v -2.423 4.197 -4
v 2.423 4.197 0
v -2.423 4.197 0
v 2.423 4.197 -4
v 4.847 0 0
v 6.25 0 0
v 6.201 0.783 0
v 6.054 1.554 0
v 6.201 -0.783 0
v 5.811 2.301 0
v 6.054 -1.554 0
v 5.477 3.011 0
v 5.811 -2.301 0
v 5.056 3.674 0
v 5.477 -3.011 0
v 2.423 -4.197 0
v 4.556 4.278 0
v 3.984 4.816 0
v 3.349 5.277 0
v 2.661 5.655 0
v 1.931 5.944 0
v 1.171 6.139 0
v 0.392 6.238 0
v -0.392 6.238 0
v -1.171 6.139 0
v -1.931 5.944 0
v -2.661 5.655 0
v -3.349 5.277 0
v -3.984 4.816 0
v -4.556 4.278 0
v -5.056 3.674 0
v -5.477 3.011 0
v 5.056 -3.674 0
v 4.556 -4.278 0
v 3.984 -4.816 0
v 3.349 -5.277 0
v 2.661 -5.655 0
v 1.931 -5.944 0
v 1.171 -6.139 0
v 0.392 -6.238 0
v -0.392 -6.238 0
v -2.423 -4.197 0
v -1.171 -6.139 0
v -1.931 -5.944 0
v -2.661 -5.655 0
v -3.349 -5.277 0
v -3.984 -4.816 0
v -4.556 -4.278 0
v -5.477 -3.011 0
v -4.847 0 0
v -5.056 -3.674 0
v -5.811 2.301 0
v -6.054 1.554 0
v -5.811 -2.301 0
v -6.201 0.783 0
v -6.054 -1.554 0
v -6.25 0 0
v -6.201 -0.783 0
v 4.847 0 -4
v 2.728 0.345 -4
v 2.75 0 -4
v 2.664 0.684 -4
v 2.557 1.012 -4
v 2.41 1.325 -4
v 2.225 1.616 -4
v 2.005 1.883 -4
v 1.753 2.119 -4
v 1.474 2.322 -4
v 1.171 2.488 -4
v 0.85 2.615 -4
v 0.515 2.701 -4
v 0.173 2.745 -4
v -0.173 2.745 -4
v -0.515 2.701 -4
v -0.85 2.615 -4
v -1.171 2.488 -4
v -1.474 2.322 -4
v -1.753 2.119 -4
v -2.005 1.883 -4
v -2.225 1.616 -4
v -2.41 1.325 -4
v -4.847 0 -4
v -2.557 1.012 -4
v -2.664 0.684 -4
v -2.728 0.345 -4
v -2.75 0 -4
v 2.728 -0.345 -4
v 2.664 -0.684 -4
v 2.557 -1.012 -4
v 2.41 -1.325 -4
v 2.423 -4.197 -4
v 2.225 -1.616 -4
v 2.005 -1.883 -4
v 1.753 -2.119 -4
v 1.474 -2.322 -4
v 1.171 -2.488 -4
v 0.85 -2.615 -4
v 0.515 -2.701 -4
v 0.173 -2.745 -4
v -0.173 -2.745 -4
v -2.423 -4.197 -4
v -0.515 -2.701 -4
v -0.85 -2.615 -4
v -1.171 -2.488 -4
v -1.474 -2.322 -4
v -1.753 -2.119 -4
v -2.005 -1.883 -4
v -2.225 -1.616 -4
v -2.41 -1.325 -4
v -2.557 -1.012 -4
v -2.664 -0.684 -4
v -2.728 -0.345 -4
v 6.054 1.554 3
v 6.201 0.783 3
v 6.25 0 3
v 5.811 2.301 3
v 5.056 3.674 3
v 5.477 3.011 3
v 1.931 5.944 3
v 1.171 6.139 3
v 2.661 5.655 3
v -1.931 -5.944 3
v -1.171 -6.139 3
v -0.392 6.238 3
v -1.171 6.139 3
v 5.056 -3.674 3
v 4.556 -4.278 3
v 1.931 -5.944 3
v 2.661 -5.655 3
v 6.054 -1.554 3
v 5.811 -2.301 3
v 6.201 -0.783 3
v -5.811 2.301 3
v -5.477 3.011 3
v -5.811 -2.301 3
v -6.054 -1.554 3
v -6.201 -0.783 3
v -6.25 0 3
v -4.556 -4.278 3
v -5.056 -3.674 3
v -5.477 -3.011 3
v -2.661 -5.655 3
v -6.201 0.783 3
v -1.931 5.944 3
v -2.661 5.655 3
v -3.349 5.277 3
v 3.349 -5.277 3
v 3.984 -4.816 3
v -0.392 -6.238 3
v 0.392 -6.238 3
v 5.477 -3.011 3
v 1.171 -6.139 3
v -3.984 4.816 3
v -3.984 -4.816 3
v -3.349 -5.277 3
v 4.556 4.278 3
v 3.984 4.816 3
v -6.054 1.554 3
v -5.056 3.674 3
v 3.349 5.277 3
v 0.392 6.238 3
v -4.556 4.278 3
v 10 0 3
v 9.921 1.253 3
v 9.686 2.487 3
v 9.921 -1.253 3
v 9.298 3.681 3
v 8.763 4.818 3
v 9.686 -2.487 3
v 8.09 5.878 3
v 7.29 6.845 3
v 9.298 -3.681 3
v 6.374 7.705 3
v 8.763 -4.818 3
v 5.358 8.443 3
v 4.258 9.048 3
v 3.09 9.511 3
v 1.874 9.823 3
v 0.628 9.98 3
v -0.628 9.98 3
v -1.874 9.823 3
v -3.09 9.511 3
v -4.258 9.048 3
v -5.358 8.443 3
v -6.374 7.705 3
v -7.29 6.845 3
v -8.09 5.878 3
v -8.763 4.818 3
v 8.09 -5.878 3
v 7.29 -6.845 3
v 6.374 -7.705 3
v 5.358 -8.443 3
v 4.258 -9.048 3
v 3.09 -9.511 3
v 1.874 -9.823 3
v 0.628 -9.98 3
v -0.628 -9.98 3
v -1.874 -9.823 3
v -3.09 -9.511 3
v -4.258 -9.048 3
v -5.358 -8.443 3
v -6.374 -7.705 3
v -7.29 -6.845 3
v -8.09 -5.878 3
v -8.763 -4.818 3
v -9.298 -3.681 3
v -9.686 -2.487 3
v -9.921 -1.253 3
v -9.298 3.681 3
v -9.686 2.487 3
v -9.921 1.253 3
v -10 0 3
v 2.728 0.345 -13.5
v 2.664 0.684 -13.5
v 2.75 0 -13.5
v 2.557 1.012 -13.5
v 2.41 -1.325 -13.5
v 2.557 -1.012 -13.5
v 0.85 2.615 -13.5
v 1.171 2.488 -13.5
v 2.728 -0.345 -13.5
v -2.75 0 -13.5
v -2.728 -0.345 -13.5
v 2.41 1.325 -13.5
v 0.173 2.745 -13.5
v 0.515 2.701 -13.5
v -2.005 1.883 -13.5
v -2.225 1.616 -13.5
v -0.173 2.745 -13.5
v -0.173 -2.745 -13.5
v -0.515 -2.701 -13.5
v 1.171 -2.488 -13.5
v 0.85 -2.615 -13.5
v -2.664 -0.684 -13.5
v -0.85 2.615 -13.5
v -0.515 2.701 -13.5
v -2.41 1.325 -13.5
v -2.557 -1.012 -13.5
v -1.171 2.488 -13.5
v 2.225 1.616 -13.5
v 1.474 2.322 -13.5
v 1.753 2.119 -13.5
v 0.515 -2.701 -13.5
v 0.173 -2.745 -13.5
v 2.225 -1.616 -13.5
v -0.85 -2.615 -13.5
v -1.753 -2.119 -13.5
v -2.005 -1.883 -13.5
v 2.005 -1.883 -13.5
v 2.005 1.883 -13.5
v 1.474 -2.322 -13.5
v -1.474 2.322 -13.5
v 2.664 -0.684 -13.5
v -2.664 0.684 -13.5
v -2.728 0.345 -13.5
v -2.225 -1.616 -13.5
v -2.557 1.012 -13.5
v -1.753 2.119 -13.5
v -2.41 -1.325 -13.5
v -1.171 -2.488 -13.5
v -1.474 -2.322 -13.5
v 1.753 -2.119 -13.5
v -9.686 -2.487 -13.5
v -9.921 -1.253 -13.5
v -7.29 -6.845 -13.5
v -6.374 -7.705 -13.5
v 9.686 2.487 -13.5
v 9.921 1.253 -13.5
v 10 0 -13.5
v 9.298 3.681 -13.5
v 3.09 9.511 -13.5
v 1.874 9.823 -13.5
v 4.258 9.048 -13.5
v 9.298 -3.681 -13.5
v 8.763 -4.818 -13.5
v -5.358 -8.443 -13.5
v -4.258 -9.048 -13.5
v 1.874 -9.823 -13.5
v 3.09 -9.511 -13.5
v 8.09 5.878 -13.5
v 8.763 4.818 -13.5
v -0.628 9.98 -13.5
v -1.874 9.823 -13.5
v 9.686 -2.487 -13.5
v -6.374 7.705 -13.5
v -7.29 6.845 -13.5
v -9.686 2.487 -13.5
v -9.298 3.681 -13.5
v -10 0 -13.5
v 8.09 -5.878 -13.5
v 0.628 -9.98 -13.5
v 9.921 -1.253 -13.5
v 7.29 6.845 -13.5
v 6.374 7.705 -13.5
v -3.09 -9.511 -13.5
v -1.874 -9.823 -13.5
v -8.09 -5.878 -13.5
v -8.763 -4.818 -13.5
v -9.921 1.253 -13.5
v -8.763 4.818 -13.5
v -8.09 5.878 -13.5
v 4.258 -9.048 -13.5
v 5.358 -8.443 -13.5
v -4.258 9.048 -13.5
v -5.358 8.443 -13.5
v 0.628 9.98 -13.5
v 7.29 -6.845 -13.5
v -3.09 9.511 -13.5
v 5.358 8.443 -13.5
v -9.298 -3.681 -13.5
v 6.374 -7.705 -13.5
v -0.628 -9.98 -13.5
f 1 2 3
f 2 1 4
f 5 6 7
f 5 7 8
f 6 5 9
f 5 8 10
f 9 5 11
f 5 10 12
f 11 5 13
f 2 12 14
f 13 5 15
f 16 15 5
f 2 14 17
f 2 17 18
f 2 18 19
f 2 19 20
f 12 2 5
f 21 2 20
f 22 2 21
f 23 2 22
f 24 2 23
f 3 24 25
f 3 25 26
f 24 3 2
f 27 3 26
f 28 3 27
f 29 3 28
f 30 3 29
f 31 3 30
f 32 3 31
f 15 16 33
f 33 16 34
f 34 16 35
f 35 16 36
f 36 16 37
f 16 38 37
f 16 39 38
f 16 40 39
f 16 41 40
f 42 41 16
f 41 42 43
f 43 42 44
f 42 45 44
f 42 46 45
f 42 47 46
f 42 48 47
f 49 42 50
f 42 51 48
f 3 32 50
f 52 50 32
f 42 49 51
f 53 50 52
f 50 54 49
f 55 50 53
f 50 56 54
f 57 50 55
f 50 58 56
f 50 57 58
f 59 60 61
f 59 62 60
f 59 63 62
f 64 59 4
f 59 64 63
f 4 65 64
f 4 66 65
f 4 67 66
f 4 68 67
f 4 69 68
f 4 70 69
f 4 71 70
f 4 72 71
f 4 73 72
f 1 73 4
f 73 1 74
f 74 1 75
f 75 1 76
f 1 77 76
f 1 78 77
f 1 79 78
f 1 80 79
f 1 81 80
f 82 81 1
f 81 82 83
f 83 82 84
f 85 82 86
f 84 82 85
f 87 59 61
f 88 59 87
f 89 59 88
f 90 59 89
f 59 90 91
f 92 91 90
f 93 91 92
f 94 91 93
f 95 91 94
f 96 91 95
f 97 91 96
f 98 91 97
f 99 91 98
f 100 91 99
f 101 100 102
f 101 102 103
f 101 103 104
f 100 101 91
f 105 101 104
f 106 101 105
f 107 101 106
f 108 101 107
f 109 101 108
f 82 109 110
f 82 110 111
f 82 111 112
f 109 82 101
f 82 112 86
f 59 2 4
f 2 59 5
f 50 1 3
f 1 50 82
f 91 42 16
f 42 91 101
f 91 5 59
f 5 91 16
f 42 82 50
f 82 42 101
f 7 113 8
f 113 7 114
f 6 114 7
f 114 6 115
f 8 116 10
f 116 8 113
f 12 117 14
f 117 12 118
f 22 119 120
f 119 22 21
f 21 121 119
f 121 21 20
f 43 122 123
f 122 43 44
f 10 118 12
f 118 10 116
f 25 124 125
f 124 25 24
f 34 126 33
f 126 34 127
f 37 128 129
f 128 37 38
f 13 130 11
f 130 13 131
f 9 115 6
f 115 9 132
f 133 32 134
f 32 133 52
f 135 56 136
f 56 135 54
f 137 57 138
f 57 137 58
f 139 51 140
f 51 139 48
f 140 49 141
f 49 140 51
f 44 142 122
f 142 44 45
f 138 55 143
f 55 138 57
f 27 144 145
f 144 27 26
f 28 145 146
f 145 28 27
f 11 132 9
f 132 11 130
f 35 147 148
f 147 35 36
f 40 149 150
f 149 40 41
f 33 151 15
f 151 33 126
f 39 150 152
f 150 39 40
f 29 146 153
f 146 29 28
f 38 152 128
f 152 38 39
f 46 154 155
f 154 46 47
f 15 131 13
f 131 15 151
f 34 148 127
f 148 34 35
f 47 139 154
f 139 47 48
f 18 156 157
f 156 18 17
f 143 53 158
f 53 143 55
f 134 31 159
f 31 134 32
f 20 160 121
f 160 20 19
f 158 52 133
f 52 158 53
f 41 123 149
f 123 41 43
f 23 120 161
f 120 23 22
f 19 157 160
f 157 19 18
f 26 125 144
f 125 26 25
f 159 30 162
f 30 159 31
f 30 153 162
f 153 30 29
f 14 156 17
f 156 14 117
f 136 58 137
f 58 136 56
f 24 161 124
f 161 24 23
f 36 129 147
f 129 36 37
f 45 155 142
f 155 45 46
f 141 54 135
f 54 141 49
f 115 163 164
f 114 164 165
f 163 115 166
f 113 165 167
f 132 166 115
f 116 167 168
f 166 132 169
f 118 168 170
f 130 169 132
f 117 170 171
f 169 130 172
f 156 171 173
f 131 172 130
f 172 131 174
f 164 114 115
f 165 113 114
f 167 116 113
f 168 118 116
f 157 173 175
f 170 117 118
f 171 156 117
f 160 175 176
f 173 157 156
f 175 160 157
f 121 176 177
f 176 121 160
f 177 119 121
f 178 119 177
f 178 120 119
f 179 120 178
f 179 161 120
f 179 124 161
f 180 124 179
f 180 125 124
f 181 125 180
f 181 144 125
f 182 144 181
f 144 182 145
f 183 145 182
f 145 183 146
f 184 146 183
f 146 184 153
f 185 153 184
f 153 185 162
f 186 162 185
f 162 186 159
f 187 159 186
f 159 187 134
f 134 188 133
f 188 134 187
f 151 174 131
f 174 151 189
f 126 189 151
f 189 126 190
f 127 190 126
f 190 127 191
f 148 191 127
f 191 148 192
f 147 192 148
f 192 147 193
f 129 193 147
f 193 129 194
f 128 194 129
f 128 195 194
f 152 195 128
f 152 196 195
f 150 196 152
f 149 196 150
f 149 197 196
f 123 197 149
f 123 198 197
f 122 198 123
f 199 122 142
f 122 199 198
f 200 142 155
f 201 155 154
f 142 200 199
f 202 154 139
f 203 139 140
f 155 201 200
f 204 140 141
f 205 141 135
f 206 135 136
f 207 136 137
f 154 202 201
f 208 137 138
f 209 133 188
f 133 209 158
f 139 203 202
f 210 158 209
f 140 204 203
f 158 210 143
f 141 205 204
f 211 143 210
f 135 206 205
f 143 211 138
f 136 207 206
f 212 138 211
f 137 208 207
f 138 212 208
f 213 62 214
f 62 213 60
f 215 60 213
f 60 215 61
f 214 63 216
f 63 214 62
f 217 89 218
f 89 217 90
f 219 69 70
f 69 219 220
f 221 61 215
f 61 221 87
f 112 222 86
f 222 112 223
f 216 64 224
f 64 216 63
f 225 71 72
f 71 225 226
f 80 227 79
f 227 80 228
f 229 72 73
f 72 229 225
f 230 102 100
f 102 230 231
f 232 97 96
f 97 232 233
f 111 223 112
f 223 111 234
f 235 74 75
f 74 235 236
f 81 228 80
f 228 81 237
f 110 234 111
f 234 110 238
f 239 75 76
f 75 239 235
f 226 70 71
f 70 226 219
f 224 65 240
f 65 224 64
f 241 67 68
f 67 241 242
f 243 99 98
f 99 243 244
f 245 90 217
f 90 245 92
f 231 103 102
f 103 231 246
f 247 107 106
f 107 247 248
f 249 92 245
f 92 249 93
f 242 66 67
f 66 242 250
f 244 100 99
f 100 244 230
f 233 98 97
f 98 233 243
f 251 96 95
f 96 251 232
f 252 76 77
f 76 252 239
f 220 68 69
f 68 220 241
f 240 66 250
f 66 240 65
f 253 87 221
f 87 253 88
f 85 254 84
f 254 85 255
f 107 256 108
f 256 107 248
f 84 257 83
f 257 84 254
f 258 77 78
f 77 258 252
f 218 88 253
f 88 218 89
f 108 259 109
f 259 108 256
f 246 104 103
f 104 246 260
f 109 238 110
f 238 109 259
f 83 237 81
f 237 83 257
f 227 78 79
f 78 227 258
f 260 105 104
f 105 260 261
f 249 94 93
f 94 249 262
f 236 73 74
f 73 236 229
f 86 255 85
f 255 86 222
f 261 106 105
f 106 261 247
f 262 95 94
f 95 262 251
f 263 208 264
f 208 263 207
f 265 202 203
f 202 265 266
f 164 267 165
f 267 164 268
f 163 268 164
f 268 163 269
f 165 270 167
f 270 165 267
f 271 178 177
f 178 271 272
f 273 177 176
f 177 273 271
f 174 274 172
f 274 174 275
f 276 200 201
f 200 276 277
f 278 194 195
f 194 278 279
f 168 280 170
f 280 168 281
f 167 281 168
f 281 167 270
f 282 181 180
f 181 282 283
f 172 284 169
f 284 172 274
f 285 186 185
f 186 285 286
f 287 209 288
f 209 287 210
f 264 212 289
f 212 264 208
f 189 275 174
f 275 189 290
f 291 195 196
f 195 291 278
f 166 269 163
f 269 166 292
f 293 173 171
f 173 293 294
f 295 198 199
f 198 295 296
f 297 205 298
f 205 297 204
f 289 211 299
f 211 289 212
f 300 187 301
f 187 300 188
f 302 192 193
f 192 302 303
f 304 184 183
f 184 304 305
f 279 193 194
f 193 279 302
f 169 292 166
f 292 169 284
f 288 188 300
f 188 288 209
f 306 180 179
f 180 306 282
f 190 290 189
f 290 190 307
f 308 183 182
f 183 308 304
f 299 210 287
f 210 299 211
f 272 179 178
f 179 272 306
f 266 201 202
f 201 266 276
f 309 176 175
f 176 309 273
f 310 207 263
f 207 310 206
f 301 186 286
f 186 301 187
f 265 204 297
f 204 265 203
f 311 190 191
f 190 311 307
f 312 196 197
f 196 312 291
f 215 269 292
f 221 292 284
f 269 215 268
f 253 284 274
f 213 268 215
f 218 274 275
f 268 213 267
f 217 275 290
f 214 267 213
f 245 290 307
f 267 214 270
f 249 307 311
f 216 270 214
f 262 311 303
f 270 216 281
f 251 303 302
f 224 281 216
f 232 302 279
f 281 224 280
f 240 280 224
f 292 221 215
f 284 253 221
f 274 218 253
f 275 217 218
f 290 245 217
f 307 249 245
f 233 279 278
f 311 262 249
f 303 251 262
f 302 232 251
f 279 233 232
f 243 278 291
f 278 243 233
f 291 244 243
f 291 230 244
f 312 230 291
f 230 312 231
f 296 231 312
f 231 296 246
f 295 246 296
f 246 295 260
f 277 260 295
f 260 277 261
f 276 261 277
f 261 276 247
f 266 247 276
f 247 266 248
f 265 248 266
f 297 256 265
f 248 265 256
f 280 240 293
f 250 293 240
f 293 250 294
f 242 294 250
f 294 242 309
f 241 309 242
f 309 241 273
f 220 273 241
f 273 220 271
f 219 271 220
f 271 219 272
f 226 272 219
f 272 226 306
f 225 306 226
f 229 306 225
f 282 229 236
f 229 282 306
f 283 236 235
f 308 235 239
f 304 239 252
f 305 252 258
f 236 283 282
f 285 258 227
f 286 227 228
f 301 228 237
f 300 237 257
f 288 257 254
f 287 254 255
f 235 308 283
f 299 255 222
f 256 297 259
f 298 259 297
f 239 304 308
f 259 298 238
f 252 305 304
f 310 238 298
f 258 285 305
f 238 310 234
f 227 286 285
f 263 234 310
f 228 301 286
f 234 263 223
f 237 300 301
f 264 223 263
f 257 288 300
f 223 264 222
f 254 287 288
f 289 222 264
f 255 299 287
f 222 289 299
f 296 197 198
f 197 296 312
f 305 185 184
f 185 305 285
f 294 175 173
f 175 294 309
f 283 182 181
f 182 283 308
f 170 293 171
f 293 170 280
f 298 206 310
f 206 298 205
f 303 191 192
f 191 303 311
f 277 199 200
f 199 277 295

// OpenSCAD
$fn = 50;

difference() {
	union() {
		translate(v = [0, 0, -13.5]) {
			cylinder(h = 16.5, r = 10.0);
		}
	}
	union() {
		translate(v = [0, 0, 0]) {
			rotate(a = [0, 0, 0]) {
				difference() {
					union() {
						translate(v = [0, 0, -4]) {
							linear_extrude(height = 4) {
								polygon(points = [[4.8468, 0.0], [2.4234000000000004, 4.197451927062417], [-2.423399999999999, 4.197451927062417], [-4.8468, 5.935618106107392e-16], [-2.423400000000002, -4.197451927062416], [2.423399999999997, -4.197451927062419]]);
							}
						}
					}
					union();
				}
			}
		}
		#cylinder(h = 3, r = 6.25);
		#translate(v = [0, 0, -100.0]) {
			cylinder(h = 200, r = 2.75);
		}
	}
}
